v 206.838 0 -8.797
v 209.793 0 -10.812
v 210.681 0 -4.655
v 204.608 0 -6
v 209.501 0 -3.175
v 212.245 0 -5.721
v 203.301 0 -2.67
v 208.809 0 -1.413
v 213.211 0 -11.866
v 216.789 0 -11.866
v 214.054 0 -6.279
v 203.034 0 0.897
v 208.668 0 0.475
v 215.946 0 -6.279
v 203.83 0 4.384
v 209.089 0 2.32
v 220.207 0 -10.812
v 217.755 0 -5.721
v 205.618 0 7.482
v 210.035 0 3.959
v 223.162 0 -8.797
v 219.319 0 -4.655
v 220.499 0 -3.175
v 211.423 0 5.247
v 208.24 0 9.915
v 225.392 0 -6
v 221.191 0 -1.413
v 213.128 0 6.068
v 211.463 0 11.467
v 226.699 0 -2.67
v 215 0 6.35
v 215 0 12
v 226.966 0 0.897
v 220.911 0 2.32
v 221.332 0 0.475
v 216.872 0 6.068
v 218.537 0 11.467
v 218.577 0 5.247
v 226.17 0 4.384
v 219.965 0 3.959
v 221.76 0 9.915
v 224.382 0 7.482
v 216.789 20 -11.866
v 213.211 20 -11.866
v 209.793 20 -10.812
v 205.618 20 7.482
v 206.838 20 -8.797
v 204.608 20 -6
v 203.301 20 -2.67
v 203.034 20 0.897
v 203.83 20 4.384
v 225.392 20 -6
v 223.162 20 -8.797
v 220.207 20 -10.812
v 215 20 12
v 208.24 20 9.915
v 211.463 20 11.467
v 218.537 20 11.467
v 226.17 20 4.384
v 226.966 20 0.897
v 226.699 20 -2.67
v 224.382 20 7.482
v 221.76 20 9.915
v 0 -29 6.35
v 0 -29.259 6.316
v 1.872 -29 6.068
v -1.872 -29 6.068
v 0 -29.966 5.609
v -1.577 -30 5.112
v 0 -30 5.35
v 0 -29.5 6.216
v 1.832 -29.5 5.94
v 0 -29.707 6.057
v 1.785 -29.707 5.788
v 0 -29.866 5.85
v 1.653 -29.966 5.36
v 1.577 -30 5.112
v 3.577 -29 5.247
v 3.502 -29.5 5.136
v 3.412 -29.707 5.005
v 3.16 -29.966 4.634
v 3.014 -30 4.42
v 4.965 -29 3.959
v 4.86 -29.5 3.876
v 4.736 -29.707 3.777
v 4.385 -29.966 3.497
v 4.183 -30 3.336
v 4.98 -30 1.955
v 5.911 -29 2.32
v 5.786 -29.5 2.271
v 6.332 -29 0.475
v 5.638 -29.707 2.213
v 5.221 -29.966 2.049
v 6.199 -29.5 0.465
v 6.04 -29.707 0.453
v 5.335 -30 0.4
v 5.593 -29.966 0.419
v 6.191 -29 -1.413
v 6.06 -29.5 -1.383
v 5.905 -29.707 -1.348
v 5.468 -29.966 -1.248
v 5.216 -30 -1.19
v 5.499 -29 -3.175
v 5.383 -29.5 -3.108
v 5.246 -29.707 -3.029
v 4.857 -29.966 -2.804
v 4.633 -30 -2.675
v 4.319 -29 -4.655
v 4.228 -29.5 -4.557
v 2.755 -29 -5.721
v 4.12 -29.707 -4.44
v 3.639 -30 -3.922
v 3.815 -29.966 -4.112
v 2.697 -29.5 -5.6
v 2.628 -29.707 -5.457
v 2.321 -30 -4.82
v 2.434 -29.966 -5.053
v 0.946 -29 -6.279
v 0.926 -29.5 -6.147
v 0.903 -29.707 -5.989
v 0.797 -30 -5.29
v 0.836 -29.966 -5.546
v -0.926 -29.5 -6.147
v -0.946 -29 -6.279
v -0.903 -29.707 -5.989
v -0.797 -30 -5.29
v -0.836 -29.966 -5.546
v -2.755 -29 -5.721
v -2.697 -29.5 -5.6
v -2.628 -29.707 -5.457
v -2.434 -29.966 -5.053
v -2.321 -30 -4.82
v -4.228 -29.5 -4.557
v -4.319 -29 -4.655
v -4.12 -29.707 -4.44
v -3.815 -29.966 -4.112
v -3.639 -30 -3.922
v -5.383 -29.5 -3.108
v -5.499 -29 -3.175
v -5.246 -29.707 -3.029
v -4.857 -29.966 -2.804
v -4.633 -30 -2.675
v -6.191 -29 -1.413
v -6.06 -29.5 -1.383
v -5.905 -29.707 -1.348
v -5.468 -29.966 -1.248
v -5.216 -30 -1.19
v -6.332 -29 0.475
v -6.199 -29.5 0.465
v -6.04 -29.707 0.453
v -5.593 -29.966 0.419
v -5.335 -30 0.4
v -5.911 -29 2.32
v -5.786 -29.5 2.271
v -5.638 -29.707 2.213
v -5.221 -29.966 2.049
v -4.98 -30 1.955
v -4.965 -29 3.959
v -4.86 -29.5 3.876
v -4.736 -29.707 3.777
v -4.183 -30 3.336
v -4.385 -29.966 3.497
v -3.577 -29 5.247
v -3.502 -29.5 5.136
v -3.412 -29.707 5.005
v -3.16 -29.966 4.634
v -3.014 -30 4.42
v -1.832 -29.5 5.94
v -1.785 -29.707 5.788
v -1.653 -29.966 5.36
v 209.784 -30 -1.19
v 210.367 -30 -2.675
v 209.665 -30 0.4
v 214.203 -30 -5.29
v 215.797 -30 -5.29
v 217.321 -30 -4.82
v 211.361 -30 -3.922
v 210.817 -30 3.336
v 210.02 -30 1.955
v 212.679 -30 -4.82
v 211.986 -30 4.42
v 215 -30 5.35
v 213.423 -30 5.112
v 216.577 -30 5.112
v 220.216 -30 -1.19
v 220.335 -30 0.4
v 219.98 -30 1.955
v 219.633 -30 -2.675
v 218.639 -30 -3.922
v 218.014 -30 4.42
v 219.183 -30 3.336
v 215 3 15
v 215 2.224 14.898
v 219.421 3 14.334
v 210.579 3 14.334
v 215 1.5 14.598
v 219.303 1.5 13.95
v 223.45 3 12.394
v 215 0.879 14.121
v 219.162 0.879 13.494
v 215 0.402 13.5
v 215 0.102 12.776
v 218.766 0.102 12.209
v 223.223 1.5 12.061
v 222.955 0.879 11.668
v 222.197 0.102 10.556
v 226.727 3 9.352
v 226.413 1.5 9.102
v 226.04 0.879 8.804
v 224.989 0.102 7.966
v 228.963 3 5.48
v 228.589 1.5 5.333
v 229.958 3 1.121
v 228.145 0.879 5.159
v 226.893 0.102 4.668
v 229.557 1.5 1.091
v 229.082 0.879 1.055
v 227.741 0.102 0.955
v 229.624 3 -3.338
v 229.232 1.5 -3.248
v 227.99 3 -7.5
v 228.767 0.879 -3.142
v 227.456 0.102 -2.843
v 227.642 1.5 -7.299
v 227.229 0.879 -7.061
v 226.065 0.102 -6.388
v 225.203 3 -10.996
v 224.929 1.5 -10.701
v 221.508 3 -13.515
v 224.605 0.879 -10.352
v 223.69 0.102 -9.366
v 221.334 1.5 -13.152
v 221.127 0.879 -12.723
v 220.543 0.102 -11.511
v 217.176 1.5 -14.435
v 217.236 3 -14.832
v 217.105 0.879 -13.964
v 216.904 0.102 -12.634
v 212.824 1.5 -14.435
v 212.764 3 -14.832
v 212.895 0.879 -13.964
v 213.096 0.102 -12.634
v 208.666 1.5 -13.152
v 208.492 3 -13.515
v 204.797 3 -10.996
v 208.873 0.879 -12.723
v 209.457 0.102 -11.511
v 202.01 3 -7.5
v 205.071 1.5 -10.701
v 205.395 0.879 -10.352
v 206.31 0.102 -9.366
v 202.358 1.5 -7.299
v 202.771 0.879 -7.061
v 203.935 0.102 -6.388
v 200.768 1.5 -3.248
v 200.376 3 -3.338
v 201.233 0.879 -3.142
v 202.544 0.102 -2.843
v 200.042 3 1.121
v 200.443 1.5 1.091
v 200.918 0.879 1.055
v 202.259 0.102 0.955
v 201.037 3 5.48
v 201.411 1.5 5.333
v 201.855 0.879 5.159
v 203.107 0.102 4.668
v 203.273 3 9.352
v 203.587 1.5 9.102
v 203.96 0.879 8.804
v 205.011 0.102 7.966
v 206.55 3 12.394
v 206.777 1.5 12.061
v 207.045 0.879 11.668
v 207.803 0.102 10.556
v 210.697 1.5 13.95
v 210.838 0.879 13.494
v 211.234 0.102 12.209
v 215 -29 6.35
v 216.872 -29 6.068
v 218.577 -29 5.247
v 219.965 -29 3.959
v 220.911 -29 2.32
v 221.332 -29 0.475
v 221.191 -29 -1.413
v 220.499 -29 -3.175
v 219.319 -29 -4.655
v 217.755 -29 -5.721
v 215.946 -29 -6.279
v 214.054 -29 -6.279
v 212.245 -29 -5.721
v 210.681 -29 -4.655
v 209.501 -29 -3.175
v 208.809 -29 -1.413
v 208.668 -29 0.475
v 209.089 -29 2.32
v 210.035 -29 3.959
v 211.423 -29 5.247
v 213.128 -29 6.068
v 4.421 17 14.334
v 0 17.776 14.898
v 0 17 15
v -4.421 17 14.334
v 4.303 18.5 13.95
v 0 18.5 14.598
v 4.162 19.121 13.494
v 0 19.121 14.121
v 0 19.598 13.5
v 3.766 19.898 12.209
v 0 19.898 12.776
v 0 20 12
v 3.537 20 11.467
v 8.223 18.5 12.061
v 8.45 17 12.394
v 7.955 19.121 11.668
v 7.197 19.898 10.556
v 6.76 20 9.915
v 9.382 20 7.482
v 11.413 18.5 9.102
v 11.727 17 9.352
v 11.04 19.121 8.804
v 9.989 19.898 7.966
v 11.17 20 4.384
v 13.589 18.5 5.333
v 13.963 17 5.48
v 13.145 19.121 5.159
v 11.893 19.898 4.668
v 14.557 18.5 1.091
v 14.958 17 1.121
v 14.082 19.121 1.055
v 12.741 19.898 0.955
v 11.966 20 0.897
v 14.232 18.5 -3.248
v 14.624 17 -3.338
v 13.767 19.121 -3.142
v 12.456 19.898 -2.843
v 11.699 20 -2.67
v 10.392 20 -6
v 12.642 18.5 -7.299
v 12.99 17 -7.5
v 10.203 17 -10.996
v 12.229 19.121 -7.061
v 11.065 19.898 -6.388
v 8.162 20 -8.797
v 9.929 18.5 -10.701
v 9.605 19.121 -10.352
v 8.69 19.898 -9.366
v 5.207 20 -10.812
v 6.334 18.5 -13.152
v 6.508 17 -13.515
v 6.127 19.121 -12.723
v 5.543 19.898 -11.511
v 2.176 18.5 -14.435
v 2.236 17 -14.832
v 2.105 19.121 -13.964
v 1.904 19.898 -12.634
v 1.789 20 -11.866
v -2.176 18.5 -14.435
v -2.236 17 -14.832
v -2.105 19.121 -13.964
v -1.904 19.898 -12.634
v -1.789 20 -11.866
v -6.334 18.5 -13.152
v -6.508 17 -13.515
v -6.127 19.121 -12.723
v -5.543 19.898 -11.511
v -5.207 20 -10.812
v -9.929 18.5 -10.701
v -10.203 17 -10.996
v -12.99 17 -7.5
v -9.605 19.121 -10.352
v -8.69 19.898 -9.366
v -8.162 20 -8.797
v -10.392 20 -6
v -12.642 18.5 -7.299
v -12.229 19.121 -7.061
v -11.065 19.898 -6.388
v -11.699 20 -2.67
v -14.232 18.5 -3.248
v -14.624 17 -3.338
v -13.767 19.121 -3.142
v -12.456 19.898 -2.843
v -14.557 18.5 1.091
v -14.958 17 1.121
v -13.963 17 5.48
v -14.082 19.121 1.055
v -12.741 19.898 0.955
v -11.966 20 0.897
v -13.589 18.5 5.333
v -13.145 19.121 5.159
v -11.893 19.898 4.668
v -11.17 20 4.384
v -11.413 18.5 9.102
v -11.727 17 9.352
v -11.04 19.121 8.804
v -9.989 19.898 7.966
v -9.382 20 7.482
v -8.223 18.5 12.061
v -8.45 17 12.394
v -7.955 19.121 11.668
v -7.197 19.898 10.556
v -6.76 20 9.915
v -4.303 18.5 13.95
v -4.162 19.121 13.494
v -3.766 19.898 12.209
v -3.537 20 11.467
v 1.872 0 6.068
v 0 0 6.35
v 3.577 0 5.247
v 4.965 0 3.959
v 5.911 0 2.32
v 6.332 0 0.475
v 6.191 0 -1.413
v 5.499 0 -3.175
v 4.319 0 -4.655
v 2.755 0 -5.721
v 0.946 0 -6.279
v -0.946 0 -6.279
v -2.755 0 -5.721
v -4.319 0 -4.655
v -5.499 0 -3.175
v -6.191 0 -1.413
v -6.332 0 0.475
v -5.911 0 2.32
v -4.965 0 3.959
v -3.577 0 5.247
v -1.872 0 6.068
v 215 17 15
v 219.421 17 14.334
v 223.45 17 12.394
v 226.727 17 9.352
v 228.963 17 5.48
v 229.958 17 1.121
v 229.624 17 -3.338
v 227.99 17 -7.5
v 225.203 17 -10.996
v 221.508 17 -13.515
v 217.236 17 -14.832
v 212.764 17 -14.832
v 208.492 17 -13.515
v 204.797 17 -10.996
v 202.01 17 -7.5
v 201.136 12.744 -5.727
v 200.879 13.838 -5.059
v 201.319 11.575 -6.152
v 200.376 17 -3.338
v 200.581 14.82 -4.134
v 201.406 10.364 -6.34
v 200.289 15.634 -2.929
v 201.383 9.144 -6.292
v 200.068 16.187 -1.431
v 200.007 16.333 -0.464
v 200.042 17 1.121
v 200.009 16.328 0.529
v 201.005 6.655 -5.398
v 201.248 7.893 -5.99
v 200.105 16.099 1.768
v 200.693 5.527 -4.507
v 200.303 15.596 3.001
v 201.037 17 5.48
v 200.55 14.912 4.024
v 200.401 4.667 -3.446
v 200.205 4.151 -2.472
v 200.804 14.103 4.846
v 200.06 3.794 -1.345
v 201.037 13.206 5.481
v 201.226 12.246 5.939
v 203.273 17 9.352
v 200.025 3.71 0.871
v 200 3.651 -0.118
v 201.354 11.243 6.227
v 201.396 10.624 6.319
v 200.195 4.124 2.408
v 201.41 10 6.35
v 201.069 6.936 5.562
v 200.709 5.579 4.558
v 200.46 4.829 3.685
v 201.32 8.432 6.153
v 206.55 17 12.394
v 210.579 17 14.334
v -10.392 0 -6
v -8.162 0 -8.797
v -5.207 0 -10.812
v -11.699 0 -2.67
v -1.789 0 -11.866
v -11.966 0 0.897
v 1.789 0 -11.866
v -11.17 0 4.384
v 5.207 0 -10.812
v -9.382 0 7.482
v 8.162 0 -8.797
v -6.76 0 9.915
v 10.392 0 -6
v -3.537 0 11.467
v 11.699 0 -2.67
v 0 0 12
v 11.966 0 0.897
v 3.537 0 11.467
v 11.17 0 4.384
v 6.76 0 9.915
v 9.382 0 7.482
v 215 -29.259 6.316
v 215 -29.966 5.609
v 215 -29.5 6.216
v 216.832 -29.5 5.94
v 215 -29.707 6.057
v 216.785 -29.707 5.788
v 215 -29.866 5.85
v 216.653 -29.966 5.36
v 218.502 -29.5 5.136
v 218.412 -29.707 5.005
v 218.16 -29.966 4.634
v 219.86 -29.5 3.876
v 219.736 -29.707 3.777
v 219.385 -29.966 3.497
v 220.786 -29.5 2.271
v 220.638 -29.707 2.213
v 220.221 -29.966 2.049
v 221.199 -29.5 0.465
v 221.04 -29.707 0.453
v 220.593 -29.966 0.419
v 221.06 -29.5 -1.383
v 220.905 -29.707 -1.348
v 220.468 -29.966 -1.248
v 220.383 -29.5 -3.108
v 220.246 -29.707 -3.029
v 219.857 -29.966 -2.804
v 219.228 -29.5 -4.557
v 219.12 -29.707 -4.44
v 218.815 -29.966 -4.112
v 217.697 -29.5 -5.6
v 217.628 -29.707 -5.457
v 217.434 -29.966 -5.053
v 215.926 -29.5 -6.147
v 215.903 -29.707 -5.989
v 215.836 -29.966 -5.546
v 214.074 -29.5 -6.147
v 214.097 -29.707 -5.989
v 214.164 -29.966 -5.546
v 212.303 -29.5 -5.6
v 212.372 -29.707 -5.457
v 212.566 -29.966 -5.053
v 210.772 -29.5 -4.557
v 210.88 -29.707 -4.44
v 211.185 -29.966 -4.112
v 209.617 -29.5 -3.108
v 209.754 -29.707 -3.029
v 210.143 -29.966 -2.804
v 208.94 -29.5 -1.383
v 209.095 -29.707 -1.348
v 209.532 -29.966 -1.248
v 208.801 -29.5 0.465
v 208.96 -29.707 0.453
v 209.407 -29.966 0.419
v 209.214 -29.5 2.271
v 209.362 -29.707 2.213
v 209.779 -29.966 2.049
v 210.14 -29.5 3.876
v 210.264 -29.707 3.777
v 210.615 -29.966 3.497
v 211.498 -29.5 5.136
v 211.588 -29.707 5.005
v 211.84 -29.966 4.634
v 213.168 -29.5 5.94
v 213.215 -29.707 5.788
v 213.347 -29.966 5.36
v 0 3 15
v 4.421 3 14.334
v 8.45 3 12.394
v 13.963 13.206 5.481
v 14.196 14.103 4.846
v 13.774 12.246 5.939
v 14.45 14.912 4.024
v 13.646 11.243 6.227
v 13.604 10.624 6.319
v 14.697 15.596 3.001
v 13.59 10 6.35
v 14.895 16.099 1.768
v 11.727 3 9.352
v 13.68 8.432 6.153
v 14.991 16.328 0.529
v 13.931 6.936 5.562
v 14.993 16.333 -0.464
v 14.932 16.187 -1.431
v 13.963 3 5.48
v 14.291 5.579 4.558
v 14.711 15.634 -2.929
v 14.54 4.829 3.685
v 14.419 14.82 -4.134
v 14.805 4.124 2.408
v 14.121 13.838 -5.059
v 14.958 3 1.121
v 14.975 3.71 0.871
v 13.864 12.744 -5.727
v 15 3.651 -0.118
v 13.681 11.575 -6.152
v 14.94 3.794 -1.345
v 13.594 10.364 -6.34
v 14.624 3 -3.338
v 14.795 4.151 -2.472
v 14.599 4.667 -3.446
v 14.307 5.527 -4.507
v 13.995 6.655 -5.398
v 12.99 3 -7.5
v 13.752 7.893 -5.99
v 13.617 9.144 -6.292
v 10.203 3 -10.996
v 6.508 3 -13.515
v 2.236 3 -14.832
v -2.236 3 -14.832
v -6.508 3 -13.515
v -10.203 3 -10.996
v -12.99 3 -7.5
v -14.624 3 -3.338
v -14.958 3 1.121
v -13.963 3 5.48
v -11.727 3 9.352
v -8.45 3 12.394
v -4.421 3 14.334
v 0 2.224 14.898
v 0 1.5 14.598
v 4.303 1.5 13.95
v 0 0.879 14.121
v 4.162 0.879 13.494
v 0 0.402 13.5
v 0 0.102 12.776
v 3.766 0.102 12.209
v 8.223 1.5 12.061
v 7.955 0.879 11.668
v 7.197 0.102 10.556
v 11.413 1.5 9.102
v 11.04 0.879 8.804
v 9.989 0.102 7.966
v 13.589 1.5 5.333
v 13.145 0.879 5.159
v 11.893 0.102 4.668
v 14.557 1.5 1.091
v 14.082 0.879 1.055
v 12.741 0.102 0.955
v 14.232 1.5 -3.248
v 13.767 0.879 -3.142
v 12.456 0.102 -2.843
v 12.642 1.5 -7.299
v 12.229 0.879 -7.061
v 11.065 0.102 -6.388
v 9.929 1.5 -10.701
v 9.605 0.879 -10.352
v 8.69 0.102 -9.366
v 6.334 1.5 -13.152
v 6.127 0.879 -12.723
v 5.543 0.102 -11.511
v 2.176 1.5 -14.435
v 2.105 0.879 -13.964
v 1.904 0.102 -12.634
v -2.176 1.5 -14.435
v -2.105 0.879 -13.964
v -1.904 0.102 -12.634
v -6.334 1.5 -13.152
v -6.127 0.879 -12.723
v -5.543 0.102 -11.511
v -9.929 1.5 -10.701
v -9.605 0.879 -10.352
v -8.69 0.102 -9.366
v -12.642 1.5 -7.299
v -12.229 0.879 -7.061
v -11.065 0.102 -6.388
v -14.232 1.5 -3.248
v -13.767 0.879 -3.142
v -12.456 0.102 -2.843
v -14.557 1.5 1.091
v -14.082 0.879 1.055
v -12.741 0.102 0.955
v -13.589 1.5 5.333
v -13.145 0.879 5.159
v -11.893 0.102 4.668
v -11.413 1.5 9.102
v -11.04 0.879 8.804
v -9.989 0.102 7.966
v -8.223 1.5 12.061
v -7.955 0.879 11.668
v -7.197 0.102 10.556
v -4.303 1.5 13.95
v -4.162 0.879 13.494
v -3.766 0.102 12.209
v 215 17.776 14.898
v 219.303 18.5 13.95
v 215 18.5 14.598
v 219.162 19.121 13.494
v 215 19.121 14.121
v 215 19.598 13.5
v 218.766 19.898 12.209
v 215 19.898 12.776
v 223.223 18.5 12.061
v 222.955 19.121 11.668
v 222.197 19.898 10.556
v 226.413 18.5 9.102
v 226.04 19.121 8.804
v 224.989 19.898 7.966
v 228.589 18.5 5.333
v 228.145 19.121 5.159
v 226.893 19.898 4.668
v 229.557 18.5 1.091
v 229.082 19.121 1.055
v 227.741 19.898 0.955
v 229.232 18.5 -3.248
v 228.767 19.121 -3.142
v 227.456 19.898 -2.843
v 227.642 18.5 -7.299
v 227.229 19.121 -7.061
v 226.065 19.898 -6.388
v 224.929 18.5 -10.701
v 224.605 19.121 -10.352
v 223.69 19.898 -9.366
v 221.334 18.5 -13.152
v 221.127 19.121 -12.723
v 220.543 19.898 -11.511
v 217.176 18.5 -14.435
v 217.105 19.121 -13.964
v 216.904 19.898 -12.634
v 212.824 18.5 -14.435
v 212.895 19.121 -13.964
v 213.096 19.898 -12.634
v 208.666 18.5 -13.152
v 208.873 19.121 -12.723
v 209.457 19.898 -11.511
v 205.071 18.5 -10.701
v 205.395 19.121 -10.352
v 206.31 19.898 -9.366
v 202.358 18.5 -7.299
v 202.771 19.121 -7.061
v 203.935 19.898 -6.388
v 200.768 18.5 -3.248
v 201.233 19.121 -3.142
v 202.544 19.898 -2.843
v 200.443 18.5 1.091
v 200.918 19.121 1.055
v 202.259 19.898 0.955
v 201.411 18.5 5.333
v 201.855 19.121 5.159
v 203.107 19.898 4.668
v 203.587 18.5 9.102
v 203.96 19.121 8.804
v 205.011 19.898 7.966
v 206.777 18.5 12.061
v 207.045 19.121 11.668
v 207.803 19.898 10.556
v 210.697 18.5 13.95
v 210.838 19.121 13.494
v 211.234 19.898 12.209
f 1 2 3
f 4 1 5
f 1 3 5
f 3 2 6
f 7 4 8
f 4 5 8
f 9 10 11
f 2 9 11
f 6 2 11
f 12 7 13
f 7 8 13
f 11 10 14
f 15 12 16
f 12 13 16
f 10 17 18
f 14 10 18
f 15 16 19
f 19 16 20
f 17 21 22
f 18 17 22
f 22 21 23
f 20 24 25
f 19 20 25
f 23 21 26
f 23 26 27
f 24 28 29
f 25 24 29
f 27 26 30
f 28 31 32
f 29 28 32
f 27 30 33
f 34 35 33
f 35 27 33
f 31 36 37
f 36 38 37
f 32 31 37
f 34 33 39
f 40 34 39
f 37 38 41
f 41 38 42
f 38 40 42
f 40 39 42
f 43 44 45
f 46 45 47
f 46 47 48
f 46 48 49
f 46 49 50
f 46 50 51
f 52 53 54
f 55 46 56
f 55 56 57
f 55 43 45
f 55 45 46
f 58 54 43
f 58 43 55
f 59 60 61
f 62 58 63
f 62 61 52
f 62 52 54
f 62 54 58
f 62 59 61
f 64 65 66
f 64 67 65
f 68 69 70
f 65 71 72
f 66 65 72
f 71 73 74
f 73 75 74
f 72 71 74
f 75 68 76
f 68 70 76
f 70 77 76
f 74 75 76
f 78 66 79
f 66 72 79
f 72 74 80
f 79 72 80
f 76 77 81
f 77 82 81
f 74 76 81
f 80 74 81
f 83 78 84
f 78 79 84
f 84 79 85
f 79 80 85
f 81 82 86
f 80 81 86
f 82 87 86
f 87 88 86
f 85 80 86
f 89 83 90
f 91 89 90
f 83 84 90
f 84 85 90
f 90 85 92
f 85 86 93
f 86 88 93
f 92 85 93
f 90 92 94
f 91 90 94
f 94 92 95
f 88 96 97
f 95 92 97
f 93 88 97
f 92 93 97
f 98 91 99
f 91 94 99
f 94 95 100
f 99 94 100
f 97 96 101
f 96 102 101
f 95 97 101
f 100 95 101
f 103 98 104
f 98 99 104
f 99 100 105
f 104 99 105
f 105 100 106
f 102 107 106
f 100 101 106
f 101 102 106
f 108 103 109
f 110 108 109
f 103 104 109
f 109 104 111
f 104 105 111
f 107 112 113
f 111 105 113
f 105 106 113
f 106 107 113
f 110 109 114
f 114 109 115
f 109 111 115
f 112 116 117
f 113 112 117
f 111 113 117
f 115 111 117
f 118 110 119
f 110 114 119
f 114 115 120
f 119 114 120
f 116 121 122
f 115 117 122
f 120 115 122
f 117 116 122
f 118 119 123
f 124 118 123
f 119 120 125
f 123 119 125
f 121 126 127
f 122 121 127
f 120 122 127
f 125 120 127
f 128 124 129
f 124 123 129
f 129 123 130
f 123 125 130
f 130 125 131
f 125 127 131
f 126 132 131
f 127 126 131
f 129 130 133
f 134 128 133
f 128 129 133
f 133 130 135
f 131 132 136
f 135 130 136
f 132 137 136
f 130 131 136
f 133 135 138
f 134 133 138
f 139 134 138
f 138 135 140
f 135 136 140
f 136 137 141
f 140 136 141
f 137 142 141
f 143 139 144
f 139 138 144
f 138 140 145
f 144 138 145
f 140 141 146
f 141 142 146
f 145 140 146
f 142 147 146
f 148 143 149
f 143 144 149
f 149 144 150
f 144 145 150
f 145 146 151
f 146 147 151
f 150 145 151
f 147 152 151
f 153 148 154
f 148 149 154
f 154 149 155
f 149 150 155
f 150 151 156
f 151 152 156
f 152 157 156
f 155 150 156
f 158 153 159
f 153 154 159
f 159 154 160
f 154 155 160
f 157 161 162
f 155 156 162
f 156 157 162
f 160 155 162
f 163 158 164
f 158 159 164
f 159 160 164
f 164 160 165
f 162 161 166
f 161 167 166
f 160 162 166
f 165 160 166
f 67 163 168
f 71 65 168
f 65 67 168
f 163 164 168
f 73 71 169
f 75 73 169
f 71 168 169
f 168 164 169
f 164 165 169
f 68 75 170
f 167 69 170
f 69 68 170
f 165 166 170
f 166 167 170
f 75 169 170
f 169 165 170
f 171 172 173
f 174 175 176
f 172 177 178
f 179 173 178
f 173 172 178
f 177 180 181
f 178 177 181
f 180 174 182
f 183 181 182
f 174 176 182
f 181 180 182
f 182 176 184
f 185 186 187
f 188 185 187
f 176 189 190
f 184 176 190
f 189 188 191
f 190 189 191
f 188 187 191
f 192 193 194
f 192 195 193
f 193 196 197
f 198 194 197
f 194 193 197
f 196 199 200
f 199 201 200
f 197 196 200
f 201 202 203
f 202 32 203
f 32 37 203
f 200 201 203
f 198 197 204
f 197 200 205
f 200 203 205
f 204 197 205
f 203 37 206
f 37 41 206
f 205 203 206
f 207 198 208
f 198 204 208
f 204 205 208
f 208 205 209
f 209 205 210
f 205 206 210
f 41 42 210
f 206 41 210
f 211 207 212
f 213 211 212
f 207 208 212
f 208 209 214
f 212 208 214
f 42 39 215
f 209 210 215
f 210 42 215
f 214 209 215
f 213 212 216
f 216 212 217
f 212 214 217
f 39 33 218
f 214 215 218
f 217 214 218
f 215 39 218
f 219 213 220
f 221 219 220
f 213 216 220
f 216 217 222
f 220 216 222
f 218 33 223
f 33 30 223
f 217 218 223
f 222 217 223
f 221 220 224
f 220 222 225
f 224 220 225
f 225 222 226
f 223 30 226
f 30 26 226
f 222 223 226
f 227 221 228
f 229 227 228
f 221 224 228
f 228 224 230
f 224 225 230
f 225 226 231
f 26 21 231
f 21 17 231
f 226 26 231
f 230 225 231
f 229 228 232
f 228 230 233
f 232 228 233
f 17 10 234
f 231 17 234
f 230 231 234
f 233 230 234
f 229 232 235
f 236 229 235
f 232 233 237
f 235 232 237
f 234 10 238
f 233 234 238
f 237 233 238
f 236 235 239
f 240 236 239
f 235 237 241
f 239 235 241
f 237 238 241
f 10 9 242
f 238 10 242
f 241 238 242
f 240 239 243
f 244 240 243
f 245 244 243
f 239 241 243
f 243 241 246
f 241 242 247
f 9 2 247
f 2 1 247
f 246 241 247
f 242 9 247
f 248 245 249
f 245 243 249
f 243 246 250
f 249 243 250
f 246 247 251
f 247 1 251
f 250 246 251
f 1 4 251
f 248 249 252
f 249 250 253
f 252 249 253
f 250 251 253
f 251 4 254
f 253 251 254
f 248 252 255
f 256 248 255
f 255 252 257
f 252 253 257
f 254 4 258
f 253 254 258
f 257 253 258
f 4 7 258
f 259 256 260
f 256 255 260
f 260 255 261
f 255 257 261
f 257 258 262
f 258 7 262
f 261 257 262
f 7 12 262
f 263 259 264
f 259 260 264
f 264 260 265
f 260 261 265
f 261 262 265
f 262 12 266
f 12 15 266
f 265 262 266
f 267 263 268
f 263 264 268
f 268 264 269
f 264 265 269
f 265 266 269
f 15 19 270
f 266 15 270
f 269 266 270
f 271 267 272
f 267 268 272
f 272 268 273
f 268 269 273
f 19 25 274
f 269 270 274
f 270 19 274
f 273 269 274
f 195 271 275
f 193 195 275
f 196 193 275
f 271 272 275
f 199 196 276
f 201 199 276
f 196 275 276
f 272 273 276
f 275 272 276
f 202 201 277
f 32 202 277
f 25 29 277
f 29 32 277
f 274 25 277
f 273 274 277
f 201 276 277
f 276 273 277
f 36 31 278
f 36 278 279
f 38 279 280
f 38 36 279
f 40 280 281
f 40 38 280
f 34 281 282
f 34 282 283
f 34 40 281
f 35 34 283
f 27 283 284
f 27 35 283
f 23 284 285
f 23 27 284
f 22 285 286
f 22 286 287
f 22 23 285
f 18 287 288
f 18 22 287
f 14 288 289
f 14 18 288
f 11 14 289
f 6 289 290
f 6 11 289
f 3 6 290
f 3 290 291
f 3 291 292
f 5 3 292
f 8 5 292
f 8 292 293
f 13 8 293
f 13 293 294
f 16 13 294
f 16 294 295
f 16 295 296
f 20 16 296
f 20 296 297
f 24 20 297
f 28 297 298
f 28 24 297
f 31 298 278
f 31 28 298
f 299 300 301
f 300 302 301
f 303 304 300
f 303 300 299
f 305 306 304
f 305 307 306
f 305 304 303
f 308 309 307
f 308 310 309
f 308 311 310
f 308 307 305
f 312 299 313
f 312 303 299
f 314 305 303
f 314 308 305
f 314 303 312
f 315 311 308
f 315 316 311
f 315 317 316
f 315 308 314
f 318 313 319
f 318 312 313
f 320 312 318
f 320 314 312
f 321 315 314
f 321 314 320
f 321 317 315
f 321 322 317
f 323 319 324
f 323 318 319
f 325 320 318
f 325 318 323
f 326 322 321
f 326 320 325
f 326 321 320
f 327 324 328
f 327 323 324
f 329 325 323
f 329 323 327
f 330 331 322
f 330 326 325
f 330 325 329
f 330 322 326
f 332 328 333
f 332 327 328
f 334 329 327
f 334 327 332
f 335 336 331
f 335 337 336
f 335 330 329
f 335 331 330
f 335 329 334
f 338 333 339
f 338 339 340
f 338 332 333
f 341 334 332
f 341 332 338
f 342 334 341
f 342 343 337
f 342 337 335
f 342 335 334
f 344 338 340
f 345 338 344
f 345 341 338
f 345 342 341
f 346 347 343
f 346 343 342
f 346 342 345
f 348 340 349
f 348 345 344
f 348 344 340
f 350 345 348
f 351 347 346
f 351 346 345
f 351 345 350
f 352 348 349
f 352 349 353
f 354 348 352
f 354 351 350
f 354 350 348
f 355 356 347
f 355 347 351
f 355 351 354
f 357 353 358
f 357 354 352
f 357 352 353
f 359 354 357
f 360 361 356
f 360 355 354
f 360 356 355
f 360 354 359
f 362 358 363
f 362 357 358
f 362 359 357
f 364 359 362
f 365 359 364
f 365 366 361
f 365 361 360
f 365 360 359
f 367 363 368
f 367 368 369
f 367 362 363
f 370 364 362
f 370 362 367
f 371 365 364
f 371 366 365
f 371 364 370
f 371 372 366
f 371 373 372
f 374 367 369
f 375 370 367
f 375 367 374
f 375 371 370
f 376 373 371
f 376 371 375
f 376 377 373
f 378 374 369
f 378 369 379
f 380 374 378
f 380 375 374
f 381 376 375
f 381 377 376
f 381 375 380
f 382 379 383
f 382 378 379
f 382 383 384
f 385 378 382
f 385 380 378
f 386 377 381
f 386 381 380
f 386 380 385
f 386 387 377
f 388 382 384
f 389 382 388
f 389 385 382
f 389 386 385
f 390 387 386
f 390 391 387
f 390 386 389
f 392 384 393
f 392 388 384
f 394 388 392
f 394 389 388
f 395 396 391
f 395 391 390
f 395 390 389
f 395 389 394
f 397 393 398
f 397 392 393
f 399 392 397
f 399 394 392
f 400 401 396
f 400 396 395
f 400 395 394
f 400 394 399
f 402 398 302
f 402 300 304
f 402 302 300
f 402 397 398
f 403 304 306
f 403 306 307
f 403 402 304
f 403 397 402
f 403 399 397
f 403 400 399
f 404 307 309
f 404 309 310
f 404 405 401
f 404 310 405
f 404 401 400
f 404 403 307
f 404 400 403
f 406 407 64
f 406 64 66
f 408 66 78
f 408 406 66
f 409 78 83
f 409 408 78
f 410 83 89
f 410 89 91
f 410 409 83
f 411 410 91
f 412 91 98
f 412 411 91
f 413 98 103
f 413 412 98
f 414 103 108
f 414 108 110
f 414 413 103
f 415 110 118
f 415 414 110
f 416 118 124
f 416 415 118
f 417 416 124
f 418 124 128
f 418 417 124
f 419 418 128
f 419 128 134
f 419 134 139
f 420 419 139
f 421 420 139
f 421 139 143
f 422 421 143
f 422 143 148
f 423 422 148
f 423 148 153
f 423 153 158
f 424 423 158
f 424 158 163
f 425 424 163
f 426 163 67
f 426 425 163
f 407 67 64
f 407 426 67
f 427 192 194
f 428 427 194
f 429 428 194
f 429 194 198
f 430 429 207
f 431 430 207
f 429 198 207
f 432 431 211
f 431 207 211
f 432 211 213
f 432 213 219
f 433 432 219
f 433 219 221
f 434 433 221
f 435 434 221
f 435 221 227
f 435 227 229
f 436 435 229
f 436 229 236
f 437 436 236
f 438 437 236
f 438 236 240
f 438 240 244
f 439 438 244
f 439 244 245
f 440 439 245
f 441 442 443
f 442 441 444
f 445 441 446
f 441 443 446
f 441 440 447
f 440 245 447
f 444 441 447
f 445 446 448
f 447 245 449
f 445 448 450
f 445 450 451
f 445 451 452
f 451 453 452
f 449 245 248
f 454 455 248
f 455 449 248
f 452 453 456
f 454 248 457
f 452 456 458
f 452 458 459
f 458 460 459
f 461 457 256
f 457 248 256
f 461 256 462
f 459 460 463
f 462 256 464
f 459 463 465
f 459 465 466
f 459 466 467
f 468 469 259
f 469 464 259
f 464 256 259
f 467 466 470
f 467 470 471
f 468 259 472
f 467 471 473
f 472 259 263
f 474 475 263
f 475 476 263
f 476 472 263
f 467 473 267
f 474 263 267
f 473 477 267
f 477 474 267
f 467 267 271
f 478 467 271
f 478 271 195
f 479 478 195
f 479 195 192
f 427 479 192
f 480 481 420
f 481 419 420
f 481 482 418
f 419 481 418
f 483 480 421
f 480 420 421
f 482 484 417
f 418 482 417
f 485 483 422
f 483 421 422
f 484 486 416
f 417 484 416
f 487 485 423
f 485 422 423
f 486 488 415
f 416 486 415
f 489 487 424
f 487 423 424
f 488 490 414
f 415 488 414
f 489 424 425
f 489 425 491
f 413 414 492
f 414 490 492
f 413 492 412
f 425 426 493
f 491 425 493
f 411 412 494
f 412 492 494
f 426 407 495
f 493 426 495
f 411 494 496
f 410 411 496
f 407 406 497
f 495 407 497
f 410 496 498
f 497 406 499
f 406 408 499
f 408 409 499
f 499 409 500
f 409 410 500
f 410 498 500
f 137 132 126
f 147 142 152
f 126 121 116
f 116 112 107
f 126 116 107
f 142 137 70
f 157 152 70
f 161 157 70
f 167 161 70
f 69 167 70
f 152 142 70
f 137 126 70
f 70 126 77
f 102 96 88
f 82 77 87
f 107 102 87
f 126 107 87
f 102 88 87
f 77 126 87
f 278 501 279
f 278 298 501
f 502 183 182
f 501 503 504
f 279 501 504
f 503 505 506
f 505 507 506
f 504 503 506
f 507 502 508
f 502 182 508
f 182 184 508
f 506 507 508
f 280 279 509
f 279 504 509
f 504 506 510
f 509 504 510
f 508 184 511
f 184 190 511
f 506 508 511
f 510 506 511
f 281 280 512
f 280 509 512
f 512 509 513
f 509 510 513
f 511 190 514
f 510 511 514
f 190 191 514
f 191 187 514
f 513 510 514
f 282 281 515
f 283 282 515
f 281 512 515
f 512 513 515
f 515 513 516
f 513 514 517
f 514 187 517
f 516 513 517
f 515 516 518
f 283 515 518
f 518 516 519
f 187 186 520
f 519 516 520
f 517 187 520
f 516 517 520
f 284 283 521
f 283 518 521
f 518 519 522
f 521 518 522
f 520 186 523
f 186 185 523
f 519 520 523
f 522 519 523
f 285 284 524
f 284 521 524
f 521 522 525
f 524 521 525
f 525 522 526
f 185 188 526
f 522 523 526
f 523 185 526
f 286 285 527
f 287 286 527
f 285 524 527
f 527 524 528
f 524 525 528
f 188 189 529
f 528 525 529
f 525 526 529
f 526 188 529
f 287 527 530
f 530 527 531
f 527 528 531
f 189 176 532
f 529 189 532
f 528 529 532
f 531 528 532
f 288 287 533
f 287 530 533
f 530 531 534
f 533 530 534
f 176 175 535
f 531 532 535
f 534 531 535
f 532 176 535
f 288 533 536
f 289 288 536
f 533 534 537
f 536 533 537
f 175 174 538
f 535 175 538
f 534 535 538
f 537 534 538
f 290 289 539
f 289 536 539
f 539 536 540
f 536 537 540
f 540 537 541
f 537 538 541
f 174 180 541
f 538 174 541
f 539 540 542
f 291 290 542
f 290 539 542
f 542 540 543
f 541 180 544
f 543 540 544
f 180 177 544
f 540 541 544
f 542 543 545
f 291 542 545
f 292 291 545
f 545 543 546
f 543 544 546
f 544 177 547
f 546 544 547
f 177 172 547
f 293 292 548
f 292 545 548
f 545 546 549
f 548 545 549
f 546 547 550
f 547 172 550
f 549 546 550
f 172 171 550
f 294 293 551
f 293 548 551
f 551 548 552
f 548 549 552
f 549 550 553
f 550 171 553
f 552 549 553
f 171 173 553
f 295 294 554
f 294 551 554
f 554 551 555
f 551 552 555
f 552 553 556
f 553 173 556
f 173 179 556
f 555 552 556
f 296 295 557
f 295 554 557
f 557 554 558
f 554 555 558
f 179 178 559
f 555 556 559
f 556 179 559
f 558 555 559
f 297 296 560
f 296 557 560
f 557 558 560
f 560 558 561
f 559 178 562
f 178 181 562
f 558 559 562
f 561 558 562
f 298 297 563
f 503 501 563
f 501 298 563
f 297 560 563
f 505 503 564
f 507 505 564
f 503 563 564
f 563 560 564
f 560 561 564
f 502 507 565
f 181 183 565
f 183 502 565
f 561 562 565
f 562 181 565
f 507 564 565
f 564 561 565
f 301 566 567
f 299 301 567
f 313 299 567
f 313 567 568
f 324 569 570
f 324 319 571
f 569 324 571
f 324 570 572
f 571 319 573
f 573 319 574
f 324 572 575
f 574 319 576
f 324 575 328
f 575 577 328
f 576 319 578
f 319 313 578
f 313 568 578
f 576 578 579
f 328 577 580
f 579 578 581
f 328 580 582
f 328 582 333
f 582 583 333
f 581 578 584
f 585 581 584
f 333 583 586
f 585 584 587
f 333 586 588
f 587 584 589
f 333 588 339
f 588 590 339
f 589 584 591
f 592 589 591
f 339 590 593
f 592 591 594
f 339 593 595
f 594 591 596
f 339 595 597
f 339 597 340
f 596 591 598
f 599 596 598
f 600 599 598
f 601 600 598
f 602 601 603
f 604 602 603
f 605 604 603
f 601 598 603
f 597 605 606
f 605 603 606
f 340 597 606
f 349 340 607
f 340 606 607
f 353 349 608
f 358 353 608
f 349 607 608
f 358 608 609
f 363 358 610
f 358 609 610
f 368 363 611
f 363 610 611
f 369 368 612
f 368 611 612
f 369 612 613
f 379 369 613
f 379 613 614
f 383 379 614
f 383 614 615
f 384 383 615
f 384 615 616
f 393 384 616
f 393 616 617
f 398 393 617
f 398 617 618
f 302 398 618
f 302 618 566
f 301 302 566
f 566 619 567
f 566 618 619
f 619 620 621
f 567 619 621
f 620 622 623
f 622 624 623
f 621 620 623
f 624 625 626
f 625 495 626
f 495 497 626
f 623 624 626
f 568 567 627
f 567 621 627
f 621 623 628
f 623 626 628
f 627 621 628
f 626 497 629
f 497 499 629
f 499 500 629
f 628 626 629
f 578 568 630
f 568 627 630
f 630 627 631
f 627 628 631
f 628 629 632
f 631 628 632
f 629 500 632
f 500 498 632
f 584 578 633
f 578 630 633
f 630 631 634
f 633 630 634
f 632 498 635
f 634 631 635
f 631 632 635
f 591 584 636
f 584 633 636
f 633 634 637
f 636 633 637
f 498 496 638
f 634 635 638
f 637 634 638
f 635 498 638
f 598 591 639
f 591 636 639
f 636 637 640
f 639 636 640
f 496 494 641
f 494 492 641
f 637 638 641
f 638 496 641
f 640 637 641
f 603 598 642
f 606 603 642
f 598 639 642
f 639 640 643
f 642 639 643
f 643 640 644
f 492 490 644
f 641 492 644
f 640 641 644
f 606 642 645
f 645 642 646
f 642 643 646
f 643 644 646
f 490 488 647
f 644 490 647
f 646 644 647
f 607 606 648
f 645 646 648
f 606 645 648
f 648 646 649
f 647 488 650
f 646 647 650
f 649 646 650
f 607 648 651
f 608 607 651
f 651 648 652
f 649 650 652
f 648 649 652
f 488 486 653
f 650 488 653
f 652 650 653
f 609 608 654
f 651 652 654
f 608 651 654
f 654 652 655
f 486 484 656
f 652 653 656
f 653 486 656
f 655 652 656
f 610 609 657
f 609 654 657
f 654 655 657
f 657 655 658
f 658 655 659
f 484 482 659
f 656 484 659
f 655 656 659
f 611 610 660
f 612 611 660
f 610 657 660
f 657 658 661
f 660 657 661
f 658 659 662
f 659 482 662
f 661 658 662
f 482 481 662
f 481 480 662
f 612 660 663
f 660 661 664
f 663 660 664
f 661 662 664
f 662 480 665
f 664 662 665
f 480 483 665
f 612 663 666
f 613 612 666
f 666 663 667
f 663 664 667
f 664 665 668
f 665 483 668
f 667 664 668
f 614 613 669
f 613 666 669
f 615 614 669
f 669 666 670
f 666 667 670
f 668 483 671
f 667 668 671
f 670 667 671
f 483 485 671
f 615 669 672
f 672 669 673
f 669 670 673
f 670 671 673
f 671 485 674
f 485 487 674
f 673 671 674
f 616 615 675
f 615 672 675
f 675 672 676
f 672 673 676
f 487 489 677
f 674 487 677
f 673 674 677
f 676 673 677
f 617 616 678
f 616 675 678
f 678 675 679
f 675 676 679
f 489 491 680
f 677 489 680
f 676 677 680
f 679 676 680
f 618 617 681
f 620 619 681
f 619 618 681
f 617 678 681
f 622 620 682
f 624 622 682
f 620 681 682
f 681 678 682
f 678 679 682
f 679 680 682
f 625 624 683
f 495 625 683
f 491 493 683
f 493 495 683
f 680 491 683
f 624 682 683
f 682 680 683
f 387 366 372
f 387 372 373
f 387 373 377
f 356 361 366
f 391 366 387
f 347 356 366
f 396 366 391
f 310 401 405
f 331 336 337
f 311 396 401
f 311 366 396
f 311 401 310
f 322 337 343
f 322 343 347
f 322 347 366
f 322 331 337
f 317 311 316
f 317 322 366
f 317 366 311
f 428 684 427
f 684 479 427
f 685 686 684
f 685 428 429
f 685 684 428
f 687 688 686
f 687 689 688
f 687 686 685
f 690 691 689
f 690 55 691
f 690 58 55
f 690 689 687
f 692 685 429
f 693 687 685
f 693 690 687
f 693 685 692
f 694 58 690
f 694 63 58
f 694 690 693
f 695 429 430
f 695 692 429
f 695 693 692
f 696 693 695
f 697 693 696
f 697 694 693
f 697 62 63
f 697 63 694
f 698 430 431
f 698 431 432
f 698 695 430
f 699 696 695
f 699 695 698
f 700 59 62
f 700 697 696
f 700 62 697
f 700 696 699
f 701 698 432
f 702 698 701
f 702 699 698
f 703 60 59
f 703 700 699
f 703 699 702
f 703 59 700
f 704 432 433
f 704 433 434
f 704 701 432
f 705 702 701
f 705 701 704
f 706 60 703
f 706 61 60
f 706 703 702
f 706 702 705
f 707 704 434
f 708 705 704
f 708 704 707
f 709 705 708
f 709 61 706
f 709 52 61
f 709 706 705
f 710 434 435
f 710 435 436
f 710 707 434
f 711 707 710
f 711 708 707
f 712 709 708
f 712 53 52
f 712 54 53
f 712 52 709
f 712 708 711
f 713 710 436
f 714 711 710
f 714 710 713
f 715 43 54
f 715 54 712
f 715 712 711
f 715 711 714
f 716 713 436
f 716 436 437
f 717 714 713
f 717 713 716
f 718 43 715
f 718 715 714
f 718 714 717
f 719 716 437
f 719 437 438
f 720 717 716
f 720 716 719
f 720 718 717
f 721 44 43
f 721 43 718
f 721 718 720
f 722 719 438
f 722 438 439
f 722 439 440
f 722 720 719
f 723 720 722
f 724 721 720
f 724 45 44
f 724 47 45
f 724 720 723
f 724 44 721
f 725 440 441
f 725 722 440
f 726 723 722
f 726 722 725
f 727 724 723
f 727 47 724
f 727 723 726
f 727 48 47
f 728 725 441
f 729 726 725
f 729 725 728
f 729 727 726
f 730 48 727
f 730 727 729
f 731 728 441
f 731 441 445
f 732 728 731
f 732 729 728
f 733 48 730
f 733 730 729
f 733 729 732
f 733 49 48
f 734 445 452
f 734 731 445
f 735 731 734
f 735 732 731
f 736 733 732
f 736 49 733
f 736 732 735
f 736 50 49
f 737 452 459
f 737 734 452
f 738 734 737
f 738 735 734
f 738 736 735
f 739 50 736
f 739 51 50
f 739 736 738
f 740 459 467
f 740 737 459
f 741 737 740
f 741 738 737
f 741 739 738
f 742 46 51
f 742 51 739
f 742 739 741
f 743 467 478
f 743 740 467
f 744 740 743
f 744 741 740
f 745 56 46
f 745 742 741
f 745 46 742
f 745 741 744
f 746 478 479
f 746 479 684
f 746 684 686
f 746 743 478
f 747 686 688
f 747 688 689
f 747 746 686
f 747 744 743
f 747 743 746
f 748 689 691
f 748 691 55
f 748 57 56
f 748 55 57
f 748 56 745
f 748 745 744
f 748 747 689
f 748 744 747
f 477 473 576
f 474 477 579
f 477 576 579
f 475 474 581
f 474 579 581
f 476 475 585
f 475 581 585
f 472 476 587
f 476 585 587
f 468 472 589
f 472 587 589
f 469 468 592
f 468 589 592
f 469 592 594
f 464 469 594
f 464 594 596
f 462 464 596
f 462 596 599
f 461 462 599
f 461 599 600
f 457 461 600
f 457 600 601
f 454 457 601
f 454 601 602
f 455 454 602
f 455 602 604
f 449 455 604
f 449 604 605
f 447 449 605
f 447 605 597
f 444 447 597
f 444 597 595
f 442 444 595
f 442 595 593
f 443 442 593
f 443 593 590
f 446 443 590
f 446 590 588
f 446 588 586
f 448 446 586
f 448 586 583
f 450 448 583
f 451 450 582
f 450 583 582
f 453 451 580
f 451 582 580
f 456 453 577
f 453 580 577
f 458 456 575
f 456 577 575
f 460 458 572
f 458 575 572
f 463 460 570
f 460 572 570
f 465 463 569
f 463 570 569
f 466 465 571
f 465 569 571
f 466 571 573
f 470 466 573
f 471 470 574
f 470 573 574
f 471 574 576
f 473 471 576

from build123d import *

# Parameters (mm, degrees)
SKETCH1_R           = 6.35
BOSS_EXTRUDE1_DEPTH = 30
SKETCH2_R           = 15
BOSS_EXTRUDE2_DEPTH = 20
SKETCH4_R           = 6.35
BOSS_EXTRUDE3_DEPTH = 30
SKETCH5_R           = 15
BOSS_EXTRUDE4_DEPTH = 20
SKETCH6_R           = 6.35
BOSS_EXTRUDE5_DEPTH = 215
FILLET1_R           = 3
FILLET2_R           = 1


with BuildPart() as part:
    # Sketch1 → Boss-Extrude1 (new body)
    with BuildSketch(Plane(origin=(0, 0, 0), x_dir=(1, 0, 0), z_dir=(0, 1, 0))):
        with Locations(Location((0, 0, 0), (0, 0, 270))):
            Circle(SKETCH1_R)
    extrude(amount=-BOSS_EXTRUDE1_DEPTH)

    # Sketch2 → Boss-Extrude2 (add)
    with BuildSketch(Plane(origin=(0, 0, 0), x_dir=(1, 0, 0), z_dir=(0, 1, 0))):
        with Locations(Location((0, 0, 0), (0, 0, 270))):
            Circle(SKETCH2_R)
    extrude(amount=BOSS_EXTRUDE2_DEPTH)



with BuildPart() as body_2:
    # Sketch4 → Boss-Extrude3 (new body)
    with BuildSketch(Plane(origin=(0, 0, 0), x_dir=(1, 0, 0), z_dir=(0, 1, 0))):
        with Locations(Location((215, 0, 0), (0, 0, 270))):
            Circle(SKETCH4_R)
    extrude(amount=-BOSS_EXTRUDE3_DEPTH)

    # Sketch5 → Boss-Extrude4 (add)
    with BuildSketch(Plane(origin=(0, 0, 0), x_dir=(1, 0, 0), z_dir=(0, 1, 0))):
        with Locations(Location((215, 0, 0), (0, 0, 270))):
            Circle(SKETCH5_R)
    extrude(amount=BOSS_EXTRUDE4_DEPTH)


with BuildPart() as part_1:
    add(part.part)

    add(body_2.part)  # Boss-Extrude5 merges body 2
    # Sketch6 → Boss-Extrude5 (add)
    with BuildSketch(Plane(origin=(0, 0, 0), x_dir=(0, 0, -1), z_dir=(1, 0, 0))):
        with Locations(Location((0, 10, 0), (0, 0, 180))):
            Circle(SKETCH6_R)
    extrude(amount=BOSS_EXTRUDE5_DEPTH)

    # Fillet1
    fillet1_edges = [part_1.edges().sort_by_distance(p)[0] for p in [
        (215, 0, -15),
        (215, 20, -15),
        (0, 0, -15),
        (0, 20, -15),
    ]]
    fillet(fillet1_edges, radius=FILLET1_R)

    # Fillet2
    fillet2_edges = [part_1.edges().sort_by_distance(p)[0] for p in [
        (215, -30, -6.35),
        (0, -30, -6.35),
    ]]
    fillet(fillet2_edges, radius=FILLET2_R)


solid = part_1.part
